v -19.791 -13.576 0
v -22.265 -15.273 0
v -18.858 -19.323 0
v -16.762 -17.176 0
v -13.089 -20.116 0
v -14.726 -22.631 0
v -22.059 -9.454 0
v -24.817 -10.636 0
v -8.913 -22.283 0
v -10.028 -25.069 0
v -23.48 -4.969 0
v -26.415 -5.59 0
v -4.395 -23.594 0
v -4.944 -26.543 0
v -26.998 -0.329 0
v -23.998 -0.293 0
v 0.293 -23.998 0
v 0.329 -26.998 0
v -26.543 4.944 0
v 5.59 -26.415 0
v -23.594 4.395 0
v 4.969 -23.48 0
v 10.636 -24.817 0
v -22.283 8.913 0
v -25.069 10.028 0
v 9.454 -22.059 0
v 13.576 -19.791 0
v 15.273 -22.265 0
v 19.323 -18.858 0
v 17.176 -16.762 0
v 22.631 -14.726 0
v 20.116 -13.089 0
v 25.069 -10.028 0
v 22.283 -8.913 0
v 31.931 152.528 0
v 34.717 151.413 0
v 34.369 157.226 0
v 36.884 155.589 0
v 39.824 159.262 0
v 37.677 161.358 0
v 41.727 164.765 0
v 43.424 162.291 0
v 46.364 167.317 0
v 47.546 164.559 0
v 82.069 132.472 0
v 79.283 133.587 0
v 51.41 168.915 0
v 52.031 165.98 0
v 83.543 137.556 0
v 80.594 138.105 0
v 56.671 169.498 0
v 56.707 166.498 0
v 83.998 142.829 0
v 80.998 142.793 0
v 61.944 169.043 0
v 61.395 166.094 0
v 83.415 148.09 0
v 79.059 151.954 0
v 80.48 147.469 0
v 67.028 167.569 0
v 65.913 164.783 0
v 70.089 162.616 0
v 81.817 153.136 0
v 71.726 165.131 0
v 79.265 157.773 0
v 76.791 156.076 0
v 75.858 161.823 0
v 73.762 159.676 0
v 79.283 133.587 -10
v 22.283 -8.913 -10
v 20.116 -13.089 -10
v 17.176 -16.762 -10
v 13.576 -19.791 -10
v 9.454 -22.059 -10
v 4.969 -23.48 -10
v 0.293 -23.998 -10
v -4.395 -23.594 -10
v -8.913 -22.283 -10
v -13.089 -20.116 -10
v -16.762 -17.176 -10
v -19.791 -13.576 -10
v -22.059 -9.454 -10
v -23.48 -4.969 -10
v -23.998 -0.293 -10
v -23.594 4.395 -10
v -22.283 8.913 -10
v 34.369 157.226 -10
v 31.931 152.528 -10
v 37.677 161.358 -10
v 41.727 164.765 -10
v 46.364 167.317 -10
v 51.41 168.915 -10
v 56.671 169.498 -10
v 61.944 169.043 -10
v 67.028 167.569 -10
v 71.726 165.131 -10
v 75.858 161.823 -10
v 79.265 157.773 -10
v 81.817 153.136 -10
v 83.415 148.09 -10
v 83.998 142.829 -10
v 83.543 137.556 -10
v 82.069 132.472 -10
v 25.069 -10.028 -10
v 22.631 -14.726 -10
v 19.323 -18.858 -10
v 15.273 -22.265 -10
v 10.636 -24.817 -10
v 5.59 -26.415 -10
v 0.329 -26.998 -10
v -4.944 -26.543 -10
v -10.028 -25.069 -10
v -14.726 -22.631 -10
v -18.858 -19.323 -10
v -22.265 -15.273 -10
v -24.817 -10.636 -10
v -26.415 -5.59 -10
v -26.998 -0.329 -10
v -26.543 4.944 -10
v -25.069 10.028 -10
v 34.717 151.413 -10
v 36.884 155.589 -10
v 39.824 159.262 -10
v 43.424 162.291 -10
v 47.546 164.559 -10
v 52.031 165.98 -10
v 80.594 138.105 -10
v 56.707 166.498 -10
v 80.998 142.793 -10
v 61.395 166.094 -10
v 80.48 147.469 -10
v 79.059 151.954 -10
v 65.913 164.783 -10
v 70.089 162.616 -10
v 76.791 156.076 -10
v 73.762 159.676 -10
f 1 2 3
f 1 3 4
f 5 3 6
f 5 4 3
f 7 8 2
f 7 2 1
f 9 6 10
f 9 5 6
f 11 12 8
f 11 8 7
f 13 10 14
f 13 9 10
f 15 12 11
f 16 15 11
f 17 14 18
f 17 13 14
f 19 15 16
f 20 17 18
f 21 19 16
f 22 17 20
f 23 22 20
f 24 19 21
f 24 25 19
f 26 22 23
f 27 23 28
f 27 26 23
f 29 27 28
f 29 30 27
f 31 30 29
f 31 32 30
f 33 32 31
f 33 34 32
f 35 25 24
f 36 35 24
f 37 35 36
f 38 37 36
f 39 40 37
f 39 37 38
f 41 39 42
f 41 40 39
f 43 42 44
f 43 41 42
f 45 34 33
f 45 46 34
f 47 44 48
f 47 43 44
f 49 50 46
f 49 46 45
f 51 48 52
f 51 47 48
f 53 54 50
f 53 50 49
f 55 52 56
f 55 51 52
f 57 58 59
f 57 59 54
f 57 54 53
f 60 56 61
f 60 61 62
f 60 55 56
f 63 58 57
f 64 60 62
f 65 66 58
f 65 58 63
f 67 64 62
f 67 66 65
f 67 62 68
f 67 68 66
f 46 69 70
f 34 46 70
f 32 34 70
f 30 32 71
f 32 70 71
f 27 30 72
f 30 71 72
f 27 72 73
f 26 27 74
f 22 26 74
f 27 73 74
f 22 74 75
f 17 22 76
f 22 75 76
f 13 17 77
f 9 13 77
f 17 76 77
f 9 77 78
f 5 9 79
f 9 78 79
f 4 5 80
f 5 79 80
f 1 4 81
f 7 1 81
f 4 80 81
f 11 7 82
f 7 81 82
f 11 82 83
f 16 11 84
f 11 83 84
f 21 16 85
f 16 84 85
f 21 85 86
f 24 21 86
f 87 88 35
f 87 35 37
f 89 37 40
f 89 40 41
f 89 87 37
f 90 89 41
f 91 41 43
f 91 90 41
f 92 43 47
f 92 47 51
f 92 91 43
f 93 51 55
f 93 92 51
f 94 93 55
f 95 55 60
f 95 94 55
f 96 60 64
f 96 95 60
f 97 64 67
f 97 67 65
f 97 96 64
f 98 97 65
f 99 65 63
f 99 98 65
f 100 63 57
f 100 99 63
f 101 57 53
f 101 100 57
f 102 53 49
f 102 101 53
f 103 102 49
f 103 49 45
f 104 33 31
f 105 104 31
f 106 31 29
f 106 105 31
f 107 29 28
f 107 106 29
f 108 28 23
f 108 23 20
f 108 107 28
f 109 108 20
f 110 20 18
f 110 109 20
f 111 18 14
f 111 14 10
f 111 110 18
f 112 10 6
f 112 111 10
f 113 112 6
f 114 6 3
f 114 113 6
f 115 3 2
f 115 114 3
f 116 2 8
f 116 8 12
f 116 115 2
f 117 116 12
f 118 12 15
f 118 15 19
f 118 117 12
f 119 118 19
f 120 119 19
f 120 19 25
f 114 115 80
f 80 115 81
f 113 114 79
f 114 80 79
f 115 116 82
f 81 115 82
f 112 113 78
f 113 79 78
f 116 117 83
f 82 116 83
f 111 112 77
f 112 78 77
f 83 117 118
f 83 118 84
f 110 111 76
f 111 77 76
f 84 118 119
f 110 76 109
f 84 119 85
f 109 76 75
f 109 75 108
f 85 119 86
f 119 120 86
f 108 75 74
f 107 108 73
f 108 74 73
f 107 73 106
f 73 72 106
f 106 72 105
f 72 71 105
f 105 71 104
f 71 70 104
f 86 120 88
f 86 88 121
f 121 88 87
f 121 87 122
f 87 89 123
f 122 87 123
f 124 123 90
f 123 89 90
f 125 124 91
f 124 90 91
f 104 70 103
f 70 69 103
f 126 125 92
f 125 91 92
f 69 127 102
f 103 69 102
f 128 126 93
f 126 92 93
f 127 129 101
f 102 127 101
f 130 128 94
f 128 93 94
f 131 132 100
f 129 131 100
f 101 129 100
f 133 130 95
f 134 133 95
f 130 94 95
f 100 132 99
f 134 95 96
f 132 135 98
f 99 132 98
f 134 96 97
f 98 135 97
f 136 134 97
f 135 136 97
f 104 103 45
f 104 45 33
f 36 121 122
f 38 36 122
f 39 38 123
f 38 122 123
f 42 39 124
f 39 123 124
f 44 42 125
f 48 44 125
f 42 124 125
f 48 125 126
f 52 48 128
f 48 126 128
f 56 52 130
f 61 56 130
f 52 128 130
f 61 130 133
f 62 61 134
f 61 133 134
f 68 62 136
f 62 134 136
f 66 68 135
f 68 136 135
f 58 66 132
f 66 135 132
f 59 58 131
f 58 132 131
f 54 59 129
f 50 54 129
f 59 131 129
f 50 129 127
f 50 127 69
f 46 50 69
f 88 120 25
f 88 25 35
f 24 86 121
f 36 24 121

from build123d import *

# Parameters (mm, degrees)
SURFACE_EXTRUDE1_1_BACK  = 10
SURFACE_EXTRUDE1_1_DEPTH = 10
THICKEN1_T1              = 3


with BuildPart() as body_1:
    # Surface-Extrude1: a surface, the sketch's curves swept straight by 10 mm
    with BuildLine(Plane.XY.offset(-SURFACE_EXTRUDE1_1_BACK), mode=Mode.PRIVATE) as surface_extrude1_1_path:
        Line((-22.283440581, 8.913376232), (34.716559419, 151.413376232))
        ThreePointArc((34.716559419, 151.413376232), (65.913376232, 164.783440581), (79.283440581, 133.586623767))
        Line((79.283440581, 133.586623767), (22.283440581, -8.913376232))
        ThreePointArc((22.283440581, -8.913376232), (-8.913376232, -22.283440581), (-22.283440581, 8.913376232))
    surface_extrude1_1 = Shell.extrude(surface_extrude1_1_path.wire(), (0 * SURFACE_EXTRUDE1_1_DEPTH, 0 * SURFACE_EXTRUDE1_1_DEPTH, 1 * SURFACE_EXTRUDE1_1_DEPTH))
    add(Solid.thicken(surface_extrude1_1, THICKEN1_T1))


solid = body_1.part
